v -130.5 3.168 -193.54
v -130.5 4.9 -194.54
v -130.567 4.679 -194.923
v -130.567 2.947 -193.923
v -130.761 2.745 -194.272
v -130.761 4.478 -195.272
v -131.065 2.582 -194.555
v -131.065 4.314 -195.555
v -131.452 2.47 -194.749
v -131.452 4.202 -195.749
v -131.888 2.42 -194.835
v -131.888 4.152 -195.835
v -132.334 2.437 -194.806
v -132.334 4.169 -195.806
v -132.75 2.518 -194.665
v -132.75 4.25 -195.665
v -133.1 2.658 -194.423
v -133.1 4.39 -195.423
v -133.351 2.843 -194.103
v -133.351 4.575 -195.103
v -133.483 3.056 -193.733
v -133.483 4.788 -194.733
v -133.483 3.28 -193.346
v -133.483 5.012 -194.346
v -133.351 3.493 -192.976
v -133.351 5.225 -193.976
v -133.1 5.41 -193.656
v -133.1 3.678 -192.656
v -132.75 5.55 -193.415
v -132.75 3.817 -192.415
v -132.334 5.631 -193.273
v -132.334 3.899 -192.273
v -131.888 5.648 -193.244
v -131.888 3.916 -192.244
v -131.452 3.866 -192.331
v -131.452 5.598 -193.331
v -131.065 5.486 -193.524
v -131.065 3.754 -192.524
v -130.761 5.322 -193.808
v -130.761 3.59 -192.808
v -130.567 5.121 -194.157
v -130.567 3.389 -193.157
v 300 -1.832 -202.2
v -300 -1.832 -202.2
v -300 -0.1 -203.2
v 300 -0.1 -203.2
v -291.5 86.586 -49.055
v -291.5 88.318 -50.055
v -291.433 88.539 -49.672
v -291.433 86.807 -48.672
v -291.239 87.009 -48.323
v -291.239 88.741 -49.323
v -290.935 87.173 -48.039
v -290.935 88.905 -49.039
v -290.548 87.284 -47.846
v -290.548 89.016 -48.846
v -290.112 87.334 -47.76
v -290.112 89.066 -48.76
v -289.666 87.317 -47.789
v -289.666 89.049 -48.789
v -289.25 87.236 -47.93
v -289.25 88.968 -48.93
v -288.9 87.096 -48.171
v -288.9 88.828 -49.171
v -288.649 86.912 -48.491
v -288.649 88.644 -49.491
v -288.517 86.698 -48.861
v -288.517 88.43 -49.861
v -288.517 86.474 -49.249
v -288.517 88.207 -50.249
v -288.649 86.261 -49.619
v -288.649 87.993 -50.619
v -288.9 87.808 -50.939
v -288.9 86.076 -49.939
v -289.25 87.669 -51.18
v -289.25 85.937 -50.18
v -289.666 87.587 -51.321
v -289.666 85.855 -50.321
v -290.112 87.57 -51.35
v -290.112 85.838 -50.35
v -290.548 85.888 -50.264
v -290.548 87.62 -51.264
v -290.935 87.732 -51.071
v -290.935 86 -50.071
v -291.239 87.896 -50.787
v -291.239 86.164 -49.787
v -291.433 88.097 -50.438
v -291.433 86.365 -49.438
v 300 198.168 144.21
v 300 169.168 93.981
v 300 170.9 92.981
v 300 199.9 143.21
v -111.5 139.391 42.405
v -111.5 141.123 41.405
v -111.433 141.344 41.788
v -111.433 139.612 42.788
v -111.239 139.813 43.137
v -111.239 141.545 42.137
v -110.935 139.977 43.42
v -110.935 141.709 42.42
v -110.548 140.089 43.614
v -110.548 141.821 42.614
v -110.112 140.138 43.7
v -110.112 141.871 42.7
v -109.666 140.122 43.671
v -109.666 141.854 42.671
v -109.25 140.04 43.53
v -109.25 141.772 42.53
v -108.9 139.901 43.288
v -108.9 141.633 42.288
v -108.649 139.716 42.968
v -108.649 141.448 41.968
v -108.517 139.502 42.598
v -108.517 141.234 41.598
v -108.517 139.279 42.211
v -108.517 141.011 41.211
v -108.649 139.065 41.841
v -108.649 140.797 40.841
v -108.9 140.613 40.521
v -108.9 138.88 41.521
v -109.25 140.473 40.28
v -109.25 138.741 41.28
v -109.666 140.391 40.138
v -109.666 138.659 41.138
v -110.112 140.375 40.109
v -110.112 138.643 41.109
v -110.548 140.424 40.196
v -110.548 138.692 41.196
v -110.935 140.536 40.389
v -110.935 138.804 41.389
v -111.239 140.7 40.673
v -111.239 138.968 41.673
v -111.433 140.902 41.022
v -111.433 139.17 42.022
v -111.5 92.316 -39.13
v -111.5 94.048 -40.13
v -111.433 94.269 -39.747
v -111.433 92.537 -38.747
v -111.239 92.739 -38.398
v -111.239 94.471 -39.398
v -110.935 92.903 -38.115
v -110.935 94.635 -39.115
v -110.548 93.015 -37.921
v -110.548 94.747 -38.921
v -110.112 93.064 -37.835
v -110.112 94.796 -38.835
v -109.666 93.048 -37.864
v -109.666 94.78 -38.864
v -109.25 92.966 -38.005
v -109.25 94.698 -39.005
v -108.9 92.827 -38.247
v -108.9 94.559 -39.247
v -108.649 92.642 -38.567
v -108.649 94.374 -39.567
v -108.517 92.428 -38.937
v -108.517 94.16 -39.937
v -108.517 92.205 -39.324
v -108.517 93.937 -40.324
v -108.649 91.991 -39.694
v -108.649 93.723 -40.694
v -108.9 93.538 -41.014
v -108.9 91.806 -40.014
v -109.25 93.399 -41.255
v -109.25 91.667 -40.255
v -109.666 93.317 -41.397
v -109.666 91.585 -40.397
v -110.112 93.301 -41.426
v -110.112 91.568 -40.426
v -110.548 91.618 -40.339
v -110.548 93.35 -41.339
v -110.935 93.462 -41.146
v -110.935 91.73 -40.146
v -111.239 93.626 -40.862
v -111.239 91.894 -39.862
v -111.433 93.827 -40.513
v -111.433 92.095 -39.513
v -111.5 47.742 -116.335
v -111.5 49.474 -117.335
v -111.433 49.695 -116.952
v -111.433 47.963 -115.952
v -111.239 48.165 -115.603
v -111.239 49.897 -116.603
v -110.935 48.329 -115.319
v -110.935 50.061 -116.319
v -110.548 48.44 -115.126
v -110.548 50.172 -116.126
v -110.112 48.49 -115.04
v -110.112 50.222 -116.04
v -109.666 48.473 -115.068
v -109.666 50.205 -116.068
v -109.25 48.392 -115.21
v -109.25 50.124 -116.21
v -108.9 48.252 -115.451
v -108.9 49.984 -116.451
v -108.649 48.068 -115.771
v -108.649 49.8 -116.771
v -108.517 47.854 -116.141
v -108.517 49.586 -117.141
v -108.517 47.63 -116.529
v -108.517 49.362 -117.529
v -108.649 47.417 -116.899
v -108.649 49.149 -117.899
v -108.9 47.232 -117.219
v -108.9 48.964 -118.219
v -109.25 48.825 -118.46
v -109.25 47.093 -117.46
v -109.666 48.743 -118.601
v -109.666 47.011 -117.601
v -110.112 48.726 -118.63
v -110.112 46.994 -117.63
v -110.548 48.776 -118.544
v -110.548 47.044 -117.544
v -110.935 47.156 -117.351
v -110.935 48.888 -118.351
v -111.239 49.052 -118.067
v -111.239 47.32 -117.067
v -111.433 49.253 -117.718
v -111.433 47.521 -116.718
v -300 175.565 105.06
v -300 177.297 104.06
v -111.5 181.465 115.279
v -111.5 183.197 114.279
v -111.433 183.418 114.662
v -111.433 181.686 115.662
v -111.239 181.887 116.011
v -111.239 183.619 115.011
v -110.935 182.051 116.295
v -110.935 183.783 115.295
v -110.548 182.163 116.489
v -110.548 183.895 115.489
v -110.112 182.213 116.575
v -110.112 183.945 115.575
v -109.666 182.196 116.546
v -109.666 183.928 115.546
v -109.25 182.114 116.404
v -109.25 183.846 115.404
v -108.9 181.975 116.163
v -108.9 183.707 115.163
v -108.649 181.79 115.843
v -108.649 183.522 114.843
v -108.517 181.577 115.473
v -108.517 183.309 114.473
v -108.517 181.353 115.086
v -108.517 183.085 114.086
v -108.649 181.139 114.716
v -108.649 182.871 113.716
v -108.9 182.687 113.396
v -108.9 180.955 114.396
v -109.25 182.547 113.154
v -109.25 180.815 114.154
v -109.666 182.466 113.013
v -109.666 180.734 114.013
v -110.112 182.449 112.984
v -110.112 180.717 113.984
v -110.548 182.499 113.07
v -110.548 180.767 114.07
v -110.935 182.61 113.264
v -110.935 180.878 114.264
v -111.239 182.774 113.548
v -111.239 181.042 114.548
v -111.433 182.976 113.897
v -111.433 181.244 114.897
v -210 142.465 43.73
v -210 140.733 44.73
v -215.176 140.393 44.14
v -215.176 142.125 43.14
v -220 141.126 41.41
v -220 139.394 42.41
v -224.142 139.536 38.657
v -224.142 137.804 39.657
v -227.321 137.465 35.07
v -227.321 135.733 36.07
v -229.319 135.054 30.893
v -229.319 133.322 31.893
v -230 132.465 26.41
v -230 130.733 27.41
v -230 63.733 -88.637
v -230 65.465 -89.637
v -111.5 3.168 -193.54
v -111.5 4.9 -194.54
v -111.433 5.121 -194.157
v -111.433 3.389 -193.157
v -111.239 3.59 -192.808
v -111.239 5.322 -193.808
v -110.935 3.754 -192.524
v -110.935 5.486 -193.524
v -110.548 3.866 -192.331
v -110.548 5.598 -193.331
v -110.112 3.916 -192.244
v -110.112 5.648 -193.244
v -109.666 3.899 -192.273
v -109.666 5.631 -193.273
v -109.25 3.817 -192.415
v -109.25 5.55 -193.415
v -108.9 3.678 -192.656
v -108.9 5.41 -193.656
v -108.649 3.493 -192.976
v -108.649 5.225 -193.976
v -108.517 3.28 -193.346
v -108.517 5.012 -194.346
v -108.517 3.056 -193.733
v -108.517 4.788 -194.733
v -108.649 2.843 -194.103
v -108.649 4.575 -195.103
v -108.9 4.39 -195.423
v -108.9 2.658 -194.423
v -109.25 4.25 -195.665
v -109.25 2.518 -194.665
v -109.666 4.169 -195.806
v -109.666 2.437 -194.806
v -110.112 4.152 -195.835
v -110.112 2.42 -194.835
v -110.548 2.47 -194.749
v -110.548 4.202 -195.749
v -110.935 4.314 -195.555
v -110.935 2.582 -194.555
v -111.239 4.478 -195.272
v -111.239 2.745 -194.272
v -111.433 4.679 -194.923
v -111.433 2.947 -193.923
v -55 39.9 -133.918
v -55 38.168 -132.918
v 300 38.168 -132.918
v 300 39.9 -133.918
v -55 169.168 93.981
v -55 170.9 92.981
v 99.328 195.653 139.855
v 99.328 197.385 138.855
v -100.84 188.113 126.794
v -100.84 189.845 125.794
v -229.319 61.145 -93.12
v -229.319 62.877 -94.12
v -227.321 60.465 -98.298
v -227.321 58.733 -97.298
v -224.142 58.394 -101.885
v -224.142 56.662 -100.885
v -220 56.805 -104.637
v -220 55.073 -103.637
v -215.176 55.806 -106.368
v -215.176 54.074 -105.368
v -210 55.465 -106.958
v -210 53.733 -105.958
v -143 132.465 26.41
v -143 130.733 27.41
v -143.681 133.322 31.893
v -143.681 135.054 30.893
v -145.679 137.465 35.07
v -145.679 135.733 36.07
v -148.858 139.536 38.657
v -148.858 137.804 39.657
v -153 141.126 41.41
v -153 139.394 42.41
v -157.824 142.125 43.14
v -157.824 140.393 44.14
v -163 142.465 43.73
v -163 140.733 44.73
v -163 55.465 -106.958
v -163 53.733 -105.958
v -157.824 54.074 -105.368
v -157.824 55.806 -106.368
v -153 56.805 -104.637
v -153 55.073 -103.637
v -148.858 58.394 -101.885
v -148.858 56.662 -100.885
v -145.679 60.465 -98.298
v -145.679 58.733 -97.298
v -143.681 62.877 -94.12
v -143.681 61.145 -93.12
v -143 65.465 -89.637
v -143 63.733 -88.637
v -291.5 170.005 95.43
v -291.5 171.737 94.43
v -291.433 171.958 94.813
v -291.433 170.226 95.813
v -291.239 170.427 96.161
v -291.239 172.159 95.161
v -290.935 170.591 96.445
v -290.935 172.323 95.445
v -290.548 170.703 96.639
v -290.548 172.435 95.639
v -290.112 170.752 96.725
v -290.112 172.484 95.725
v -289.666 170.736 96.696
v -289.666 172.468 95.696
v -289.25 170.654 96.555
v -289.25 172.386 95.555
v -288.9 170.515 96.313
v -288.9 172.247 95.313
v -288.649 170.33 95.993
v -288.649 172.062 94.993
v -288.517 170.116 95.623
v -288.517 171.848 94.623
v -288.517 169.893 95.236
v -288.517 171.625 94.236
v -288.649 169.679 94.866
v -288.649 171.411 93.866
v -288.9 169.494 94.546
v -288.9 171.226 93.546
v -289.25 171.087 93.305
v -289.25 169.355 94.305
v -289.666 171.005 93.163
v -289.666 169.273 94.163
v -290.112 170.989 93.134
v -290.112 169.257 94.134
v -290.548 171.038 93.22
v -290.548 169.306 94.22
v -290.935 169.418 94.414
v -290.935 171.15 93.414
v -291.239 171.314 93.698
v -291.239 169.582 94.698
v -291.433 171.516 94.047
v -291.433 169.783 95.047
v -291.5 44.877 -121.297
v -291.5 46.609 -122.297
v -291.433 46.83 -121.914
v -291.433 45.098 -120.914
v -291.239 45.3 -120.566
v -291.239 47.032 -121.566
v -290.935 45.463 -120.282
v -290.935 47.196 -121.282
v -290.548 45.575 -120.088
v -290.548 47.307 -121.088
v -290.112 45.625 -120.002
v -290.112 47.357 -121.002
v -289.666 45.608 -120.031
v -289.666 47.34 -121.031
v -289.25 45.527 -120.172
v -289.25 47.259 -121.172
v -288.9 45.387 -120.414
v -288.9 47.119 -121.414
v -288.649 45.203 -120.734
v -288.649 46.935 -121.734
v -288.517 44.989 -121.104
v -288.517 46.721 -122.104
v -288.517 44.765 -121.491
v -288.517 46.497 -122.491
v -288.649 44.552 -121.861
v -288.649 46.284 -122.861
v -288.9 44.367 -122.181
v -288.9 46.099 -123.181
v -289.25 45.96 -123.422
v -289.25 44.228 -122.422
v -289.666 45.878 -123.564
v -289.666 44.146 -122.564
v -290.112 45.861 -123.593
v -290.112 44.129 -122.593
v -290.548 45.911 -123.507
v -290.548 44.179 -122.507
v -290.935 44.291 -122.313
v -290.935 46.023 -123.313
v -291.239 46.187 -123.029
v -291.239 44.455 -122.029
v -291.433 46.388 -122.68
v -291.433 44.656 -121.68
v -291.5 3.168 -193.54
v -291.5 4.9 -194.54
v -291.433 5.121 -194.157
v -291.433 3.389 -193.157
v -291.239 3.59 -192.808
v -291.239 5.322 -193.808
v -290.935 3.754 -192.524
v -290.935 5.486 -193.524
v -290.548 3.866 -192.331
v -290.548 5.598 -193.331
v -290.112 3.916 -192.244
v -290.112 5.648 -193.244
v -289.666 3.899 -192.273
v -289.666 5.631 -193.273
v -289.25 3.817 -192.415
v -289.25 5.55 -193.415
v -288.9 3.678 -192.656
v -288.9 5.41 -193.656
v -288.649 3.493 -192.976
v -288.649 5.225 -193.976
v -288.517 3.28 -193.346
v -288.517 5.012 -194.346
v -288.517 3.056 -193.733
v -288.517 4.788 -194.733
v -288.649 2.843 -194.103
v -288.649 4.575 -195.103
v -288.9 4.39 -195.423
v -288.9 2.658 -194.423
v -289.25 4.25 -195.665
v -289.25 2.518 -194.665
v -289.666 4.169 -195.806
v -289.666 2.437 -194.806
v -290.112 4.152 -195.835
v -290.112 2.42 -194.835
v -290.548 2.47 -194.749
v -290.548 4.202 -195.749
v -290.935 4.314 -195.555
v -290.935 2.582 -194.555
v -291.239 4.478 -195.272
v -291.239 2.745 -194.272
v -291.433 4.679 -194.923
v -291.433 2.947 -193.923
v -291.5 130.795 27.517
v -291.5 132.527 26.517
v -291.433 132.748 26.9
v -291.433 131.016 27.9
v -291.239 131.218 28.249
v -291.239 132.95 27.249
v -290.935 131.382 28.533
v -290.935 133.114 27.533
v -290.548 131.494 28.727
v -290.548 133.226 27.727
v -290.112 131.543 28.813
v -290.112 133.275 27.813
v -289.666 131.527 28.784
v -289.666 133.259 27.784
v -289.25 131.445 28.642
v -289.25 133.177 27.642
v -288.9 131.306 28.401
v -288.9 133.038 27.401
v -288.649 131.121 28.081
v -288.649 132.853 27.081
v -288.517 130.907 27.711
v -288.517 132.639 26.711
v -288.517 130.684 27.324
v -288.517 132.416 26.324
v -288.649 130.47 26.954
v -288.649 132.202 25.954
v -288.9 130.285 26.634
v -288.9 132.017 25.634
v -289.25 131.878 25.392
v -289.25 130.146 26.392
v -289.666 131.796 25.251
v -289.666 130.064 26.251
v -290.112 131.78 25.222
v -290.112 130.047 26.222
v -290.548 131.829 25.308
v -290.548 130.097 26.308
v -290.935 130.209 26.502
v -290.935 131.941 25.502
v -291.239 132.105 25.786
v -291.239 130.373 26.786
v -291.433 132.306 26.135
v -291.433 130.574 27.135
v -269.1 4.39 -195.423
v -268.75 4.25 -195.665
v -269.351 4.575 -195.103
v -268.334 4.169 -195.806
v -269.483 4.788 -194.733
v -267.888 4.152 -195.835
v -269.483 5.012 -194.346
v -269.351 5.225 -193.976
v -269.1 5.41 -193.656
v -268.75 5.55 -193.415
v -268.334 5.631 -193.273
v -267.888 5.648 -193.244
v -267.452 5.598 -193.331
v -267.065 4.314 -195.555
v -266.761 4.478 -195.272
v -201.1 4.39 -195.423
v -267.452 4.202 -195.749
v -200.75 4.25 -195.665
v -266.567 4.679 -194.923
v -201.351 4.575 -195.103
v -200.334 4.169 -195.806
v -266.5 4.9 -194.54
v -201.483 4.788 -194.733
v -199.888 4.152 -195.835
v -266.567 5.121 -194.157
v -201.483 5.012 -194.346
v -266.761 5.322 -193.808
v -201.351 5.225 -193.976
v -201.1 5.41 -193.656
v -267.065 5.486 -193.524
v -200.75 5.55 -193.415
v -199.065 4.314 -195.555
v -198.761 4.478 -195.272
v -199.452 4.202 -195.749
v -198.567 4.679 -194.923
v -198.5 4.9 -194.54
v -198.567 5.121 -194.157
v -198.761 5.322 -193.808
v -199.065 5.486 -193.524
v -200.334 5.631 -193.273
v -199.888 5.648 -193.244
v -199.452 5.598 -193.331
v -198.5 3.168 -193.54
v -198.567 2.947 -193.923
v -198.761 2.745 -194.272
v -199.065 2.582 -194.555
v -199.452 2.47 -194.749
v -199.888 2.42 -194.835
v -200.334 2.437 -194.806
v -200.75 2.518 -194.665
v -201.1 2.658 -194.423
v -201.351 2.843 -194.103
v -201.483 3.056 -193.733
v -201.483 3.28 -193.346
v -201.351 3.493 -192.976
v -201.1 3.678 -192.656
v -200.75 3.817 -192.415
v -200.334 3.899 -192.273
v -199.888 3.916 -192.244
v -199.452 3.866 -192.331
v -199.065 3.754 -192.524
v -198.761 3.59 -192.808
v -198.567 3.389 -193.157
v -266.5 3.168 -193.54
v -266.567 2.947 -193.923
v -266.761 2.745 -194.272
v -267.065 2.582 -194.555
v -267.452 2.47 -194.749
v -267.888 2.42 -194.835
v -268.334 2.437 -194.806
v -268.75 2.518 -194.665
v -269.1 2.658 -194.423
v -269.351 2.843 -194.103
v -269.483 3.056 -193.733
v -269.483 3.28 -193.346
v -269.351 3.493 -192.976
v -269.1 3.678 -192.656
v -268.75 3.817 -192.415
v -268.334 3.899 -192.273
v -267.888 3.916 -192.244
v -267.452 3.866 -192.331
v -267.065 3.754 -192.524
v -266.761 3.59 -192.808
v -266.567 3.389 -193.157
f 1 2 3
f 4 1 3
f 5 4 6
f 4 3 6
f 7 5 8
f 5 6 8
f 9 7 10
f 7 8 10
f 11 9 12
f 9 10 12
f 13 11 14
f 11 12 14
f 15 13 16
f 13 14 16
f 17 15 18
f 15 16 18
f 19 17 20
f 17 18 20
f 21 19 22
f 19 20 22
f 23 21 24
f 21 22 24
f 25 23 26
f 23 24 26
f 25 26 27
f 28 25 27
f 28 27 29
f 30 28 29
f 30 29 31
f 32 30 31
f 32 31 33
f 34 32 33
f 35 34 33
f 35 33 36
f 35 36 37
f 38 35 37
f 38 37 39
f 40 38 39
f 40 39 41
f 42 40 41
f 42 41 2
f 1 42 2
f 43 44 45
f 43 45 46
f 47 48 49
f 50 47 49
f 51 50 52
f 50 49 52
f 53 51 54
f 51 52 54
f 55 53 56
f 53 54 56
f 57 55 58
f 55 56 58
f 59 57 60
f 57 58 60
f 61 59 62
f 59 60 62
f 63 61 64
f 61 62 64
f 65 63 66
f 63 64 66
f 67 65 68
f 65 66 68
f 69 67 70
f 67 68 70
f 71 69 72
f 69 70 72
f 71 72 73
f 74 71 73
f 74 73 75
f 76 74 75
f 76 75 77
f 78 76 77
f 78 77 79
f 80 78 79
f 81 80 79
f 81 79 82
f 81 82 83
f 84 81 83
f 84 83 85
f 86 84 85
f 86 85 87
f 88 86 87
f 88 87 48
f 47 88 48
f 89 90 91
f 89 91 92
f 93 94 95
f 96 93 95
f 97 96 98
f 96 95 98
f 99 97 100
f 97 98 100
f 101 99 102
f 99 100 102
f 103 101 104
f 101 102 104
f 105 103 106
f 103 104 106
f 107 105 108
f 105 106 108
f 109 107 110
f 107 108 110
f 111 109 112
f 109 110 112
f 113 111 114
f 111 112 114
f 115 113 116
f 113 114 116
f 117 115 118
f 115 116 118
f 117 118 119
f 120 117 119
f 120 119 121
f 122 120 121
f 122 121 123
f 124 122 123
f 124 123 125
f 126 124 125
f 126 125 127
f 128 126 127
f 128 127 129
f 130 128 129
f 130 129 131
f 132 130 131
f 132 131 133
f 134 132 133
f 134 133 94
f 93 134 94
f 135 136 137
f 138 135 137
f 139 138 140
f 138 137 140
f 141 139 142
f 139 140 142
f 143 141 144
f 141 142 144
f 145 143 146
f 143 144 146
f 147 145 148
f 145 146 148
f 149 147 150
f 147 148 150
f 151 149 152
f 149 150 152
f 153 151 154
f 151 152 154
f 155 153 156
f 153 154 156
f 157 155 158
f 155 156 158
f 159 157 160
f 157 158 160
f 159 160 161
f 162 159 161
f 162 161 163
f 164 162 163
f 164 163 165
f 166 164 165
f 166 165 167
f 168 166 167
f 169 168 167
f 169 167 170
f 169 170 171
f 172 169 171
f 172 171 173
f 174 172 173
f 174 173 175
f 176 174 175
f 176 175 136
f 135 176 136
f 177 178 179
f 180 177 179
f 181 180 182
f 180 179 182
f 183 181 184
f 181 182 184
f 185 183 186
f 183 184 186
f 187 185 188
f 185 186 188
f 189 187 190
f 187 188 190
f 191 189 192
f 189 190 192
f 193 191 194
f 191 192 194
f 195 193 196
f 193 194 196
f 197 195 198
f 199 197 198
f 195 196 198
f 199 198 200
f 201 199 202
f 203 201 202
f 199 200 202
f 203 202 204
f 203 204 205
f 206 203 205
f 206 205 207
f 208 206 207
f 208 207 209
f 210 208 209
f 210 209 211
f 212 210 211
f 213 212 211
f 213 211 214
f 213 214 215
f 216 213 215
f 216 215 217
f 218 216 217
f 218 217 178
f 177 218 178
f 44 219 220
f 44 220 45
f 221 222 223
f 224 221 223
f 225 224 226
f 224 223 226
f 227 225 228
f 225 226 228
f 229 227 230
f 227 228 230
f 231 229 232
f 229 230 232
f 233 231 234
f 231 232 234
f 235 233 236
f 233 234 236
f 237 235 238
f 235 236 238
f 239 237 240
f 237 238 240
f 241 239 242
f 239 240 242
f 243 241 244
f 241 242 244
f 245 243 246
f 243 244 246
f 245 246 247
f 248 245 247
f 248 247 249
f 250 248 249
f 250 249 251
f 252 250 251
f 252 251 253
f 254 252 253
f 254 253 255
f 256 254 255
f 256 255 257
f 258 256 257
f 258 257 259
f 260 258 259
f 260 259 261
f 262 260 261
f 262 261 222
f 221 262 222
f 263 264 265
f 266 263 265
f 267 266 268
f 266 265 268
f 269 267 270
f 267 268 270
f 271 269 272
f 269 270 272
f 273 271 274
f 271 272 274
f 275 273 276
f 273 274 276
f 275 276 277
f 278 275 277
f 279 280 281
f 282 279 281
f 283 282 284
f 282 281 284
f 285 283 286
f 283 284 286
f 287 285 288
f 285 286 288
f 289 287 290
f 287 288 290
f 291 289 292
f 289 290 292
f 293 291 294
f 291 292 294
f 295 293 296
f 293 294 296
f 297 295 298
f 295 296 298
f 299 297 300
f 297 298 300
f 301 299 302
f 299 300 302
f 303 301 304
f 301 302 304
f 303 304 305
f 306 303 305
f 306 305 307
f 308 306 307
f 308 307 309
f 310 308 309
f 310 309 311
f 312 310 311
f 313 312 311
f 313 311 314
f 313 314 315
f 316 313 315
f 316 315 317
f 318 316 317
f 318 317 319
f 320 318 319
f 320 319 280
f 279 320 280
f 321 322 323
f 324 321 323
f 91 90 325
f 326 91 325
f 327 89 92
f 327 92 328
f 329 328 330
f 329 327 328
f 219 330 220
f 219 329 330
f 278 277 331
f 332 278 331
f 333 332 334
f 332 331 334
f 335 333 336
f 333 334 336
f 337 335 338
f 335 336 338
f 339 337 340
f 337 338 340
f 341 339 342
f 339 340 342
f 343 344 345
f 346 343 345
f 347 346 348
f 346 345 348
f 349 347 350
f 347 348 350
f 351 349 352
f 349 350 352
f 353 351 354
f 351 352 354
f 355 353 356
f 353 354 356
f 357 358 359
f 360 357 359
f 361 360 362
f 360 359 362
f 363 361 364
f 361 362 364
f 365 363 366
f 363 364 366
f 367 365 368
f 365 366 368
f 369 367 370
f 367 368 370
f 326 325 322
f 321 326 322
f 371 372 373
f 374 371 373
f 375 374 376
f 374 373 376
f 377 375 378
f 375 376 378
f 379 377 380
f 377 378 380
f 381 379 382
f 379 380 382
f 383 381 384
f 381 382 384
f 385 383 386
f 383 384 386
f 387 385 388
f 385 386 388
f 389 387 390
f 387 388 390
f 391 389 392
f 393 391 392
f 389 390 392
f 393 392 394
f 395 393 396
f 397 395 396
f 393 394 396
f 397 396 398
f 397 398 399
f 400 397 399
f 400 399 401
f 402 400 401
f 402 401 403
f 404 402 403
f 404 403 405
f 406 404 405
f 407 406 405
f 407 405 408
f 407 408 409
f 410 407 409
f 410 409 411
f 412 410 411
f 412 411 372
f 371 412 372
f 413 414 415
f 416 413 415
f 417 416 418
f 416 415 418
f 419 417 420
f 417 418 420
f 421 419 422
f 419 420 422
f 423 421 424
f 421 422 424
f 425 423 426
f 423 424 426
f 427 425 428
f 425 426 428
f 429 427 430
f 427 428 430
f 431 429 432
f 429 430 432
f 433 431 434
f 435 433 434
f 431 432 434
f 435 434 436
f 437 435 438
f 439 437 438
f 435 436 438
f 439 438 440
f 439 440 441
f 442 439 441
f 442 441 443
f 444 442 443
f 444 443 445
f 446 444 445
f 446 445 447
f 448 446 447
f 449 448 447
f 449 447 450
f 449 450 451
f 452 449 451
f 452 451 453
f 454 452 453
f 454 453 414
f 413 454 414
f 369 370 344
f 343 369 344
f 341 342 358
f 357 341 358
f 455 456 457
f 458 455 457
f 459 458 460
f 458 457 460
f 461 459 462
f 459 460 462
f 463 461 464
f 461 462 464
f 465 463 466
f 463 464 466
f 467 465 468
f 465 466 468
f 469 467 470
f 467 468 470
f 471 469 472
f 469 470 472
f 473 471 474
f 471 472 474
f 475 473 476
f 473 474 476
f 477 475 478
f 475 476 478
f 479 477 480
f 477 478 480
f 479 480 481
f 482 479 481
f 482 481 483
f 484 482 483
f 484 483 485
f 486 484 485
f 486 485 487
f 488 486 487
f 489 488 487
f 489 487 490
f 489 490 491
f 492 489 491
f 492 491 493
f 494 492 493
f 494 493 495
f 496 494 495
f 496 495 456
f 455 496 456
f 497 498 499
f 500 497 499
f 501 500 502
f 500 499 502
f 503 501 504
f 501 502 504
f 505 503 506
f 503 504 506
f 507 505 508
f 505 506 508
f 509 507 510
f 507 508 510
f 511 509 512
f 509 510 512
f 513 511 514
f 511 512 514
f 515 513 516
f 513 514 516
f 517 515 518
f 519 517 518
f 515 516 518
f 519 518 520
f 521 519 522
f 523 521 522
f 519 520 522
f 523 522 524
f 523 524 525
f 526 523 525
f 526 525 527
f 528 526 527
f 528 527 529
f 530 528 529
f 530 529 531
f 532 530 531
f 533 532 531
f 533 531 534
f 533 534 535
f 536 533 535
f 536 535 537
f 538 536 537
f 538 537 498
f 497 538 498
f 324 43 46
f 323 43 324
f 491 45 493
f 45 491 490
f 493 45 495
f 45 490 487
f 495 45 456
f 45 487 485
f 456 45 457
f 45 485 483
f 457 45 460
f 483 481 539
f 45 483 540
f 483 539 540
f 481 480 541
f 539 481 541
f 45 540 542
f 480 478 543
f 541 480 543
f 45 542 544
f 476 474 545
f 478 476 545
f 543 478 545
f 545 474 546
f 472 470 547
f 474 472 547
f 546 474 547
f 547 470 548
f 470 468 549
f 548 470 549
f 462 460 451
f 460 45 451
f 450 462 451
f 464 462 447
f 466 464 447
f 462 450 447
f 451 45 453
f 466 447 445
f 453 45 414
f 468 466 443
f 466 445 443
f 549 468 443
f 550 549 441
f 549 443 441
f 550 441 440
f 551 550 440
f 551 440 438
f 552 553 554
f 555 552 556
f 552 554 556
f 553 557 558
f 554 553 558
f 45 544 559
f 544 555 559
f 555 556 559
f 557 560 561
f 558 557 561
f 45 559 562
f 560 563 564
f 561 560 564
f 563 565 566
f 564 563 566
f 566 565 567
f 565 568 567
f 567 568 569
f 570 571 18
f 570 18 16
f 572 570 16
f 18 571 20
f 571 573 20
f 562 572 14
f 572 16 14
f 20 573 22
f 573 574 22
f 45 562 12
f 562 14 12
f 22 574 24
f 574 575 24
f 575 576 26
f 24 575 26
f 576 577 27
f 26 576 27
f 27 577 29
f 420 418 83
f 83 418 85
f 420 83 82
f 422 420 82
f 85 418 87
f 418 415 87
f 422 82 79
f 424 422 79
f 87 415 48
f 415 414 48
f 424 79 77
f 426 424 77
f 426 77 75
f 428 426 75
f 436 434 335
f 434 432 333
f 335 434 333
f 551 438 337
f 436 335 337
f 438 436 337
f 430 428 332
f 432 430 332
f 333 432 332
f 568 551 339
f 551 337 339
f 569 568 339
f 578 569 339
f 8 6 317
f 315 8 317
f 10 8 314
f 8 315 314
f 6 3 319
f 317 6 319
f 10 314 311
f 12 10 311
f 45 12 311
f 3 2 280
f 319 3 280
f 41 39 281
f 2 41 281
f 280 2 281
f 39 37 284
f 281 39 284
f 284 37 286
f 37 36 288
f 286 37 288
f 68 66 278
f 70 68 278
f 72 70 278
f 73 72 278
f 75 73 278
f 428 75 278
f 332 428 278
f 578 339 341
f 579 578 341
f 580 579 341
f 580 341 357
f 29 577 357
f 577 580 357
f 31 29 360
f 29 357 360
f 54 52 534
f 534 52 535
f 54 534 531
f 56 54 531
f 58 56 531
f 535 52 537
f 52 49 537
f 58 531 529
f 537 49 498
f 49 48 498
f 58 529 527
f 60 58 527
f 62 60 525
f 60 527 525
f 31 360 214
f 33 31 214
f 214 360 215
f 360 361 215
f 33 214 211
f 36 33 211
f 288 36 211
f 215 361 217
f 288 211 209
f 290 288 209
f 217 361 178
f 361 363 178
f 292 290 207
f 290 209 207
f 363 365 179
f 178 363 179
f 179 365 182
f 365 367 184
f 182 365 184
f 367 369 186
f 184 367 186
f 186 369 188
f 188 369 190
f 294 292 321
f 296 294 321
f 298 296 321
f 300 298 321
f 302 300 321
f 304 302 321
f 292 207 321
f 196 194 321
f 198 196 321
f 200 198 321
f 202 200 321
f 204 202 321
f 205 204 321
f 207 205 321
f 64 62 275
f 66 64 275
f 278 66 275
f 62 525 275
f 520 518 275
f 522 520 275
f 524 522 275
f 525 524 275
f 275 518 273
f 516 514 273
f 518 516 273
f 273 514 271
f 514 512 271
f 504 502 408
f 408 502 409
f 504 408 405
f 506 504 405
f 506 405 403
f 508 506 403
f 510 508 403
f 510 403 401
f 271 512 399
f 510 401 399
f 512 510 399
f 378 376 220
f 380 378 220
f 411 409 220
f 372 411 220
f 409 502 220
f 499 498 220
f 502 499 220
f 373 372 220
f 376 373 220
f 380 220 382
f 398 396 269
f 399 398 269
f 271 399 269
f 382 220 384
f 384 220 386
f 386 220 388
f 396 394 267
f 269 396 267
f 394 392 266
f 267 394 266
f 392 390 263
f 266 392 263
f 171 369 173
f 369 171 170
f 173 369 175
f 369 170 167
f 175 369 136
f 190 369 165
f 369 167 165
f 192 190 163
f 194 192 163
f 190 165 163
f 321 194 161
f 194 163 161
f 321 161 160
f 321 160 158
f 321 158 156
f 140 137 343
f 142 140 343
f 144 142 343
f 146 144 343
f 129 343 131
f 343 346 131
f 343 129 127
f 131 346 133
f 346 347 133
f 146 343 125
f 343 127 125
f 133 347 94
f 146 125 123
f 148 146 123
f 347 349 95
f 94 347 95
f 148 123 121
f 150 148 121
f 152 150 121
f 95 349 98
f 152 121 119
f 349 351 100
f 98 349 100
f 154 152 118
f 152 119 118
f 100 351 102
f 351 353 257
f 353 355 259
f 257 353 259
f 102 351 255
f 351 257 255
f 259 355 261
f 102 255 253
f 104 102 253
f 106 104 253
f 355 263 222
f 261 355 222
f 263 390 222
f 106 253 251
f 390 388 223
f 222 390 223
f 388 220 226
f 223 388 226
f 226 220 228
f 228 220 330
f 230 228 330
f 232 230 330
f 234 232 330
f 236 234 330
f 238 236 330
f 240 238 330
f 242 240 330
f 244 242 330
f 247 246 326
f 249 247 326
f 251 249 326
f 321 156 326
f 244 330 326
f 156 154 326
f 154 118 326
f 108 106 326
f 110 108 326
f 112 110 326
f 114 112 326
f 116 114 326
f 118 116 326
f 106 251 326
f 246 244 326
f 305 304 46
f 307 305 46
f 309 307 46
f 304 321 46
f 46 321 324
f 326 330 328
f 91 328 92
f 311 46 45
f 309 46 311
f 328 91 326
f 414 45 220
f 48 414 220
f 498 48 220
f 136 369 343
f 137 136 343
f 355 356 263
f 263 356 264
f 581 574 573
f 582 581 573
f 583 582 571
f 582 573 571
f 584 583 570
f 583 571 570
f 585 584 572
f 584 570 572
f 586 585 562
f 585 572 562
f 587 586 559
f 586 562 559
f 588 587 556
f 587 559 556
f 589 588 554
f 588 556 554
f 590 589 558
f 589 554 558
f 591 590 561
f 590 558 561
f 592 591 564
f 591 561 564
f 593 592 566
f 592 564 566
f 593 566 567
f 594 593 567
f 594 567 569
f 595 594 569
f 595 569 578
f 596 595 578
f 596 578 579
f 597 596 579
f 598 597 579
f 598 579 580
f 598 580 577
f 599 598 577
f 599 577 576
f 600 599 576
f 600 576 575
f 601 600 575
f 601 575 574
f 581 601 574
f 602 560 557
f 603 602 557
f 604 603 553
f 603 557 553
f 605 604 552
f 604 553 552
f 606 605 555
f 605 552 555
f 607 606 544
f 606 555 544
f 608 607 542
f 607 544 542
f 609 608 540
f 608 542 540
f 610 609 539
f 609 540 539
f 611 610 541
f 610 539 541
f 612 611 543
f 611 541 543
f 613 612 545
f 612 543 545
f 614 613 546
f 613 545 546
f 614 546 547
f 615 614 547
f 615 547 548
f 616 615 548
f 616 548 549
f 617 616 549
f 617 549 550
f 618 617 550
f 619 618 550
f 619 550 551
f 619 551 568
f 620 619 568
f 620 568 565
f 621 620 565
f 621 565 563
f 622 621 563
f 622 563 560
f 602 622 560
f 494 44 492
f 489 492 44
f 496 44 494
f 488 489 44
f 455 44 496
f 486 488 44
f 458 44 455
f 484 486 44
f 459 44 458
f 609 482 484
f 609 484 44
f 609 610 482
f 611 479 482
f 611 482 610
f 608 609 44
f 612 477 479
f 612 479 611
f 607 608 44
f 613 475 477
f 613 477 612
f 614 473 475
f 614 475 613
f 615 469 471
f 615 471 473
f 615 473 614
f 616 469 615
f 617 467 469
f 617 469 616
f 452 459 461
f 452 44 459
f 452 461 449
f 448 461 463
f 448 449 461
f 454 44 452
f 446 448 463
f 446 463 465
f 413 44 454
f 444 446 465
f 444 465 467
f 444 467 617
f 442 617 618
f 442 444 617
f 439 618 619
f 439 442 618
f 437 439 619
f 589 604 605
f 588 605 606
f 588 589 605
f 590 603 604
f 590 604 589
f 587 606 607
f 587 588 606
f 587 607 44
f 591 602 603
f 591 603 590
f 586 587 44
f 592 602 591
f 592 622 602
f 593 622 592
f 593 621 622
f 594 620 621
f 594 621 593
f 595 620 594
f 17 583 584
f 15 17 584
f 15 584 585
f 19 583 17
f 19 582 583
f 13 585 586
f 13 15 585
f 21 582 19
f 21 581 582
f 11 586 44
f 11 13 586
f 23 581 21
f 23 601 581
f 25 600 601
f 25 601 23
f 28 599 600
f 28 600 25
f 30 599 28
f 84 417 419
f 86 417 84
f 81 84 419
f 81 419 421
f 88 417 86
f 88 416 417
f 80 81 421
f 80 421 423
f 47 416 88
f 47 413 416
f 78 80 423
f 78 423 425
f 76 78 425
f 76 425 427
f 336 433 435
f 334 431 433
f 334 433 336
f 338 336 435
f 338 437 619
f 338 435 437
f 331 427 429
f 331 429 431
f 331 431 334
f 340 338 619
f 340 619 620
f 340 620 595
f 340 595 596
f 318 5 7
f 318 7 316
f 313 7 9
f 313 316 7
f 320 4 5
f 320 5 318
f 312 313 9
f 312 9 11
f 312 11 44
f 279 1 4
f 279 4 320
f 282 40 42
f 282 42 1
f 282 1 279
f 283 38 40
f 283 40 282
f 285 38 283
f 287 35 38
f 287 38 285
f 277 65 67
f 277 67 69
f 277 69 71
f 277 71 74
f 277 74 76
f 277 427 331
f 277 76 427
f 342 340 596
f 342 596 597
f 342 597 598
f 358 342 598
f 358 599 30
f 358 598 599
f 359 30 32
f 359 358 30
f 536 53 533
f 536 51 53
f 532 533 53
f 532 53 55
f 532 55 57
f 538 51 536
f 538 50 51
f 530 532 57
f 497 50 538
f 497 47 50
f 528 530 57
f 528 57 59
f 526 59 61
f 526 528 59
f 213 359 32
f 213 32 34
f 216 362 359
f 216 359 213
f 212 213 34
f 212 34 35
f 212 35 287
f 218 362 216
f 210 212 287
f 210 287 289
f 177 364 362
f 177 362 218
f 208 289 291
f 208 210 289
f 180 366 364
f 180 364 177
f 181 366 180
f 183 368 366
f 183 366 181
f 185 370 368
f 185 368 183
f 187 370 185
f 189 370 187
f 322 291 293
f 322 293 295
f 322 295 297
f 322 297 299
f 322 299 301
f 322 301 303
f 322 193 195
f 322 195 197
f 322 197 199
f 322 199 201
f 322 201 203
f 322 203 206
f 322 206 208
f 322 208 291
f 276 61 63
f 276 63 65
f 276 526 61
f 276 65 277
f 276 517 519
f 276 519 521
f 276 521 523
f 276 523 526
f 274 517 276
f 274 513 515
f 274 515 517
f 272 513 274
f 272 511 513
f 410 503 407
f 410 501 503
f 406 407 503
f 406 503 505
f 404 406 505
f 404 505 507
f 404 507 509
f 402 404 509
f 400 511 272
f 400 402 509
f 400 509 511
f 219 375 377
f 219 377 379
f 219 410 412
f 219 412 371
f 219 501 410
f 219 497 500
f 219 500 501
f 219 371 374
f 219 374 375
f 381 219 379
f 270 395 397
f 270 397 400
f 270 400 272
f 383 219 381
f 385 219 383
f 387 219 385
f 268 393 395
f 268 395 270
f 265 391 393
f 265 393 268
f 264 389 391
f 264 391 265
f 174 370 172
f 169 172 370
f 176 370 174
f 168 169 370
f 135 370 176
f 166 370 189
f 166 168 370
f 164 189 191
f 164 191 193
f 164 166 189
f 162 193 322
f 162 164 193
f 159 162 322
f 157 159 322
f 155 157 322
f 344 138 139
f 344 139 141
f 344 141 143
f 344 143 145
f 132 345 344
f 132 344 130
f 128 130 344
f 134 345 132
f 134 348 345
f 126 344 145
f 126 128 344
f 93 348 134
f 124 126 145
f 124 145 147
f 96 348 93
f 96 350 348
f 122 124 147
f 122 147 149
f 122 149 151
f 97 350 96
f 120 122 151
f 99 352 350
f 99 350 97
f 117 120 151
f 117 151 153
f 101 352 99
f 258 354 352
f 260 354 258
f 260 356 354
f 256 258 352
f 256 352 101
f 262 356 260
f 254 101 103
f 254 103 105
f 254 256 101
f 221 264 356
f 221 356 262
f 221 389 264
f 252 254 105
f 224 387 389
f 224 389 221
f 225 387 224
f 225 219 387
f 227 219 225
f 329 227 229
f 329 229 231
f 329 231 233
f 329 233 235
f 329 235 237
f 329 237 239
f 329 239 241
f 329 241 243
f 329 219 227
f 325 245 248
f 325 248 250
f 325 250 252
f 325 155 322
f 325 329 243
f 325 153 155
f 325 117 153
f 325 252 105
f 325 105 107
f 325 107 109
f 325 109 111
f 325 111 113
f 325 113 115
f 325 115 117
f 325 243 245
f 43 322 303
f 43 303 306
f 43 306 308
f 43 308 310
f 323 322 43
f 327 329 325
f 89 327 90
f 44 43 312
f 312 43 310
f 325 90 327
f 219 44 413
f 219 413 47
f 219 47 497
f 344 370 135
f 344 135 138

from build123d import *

# Parameters (mm, degrees)
PAD003_DEPTH            = 2
SKETCH056_R             = 1.5
POCKET034_DEPTH         = 5
SKETCH063_R             = 1.5
POCKET039_DEPTH         = 5
BODY002_PLACEMENT_ANGLE = 330


with BuildPart() as part:
    # Sketch009 → Pad003 (new body)
    with BuildSketch(Plane.XZ):
        with BuildLine():
            Line((-300, -200), (300, -200))
            Line((300, -200), (300, -120))
            Line((-55, -120), (300, -120))
            Line((-55, 142), (-55, -120))
            Line((300, 142), (-55, 142))
            Line((300, 142), (300, 200))
            ThreePointArc((300, 200), (-0.8504900273, 188.6850121637), (-300, 154.7937598629))
            Line((-300, 154.7937598629), (-300, -200))
        make_face()
        with BuildLine():
            Line((-230, 65.1307599432), (-230, -68.8692400568))
            ThreePointArc((-230, -68.8692400568), (-224.1421356237, -83.0113756806), (-210, -88.8692400568))
            Line((-210, -88.8692400568), (-163, -88.8692400568))
            ThreePointArc((-163, -88.8692400568), (-148.8578643763, -83.0113756806), (-143, -68.8692400568))
            Line((-143, -68.8692400568), (-143, 65.1307599432))
            ThreePointArc((-143, 65.1307599432), (-148.8578643763, 79.2728955669), (-163, 85.1307599432))
            Line((-163, 85.1307599432), (-210, 85.1307599432))
            ThreePointArc((-210, 85.1307599432), (-224.1421356237, 79.2728955669), (-230, 65.1307599432))
        make_face(mode=Mode.SUBTRACT)
    extrude(amount=-PAD003_DEPTH)

    # Sketch056 (on Face2 of Binder014) → Pocket034 (cut)
    with BuildSketch(Plane(origin=(0, 3.7320508076, 0), x_dir=(-1, 0, 0), z_dir=(0, 1, 0))):
        with Locations((290, -190)):
            Circle(SKETCH056_R)
        with Locations((110, -190)):
            Circle(SKETCH056_R)
        with Locations((110, -100.851579)):
            Circle(SKETCH056_R)
        with Locations((110, -11.703157)):
            Circle(SKETCH056_R)
        with Locations((110, 82.445264)):
            Circle(SKETCH056_R)
        with Locations((110, 166.593685)):
            Circle(SKETCH056_R)
        with Locations((290, 143.673156)):
            Circle(SKETCH056_R)
        with Locations((290, 65.254867)):
            Circle(SKETCH056_R)
        with Locations((290, -23.163422)):
            Circle(SKETCH056_R)
        with Locations((290, -106.581711)):
            Circle(SKETCH056_R)
    extrude(amount=-POCKET034_DEPTH, mode=Mode.SUBTRACT)

    # Sketch063 (on Face5 of Pocket034) → Pocket039 (cut)
    with BuildSketch(Plane(origin=(0, 2, 0), x_dir=(1, 0, 0), z_dir=(0, 1, 0))):
        with Locations((-132, 190)):
            Circle(SKETCH063_R)
        with Locations((-200, 190)):
            Circle(SKETCH063_R)
        with Locations((-268, 190)):
            Circle(SKETCH063_R)
    extrude(amount=-POCKET039_DEPTH, mode=Mode.SUBTRACT)


with BuildPart() as part_1:
    # Body002 placement: moved
    add(part.part.moved(Location((0, 98.1679491924, -28.9949192431))).rotate(Axis((0, 98.1679491924, -28.9949192431), (1, 0, 0)), BODY002_PLACEMENT_ANGLE))


solid = part_1.part
